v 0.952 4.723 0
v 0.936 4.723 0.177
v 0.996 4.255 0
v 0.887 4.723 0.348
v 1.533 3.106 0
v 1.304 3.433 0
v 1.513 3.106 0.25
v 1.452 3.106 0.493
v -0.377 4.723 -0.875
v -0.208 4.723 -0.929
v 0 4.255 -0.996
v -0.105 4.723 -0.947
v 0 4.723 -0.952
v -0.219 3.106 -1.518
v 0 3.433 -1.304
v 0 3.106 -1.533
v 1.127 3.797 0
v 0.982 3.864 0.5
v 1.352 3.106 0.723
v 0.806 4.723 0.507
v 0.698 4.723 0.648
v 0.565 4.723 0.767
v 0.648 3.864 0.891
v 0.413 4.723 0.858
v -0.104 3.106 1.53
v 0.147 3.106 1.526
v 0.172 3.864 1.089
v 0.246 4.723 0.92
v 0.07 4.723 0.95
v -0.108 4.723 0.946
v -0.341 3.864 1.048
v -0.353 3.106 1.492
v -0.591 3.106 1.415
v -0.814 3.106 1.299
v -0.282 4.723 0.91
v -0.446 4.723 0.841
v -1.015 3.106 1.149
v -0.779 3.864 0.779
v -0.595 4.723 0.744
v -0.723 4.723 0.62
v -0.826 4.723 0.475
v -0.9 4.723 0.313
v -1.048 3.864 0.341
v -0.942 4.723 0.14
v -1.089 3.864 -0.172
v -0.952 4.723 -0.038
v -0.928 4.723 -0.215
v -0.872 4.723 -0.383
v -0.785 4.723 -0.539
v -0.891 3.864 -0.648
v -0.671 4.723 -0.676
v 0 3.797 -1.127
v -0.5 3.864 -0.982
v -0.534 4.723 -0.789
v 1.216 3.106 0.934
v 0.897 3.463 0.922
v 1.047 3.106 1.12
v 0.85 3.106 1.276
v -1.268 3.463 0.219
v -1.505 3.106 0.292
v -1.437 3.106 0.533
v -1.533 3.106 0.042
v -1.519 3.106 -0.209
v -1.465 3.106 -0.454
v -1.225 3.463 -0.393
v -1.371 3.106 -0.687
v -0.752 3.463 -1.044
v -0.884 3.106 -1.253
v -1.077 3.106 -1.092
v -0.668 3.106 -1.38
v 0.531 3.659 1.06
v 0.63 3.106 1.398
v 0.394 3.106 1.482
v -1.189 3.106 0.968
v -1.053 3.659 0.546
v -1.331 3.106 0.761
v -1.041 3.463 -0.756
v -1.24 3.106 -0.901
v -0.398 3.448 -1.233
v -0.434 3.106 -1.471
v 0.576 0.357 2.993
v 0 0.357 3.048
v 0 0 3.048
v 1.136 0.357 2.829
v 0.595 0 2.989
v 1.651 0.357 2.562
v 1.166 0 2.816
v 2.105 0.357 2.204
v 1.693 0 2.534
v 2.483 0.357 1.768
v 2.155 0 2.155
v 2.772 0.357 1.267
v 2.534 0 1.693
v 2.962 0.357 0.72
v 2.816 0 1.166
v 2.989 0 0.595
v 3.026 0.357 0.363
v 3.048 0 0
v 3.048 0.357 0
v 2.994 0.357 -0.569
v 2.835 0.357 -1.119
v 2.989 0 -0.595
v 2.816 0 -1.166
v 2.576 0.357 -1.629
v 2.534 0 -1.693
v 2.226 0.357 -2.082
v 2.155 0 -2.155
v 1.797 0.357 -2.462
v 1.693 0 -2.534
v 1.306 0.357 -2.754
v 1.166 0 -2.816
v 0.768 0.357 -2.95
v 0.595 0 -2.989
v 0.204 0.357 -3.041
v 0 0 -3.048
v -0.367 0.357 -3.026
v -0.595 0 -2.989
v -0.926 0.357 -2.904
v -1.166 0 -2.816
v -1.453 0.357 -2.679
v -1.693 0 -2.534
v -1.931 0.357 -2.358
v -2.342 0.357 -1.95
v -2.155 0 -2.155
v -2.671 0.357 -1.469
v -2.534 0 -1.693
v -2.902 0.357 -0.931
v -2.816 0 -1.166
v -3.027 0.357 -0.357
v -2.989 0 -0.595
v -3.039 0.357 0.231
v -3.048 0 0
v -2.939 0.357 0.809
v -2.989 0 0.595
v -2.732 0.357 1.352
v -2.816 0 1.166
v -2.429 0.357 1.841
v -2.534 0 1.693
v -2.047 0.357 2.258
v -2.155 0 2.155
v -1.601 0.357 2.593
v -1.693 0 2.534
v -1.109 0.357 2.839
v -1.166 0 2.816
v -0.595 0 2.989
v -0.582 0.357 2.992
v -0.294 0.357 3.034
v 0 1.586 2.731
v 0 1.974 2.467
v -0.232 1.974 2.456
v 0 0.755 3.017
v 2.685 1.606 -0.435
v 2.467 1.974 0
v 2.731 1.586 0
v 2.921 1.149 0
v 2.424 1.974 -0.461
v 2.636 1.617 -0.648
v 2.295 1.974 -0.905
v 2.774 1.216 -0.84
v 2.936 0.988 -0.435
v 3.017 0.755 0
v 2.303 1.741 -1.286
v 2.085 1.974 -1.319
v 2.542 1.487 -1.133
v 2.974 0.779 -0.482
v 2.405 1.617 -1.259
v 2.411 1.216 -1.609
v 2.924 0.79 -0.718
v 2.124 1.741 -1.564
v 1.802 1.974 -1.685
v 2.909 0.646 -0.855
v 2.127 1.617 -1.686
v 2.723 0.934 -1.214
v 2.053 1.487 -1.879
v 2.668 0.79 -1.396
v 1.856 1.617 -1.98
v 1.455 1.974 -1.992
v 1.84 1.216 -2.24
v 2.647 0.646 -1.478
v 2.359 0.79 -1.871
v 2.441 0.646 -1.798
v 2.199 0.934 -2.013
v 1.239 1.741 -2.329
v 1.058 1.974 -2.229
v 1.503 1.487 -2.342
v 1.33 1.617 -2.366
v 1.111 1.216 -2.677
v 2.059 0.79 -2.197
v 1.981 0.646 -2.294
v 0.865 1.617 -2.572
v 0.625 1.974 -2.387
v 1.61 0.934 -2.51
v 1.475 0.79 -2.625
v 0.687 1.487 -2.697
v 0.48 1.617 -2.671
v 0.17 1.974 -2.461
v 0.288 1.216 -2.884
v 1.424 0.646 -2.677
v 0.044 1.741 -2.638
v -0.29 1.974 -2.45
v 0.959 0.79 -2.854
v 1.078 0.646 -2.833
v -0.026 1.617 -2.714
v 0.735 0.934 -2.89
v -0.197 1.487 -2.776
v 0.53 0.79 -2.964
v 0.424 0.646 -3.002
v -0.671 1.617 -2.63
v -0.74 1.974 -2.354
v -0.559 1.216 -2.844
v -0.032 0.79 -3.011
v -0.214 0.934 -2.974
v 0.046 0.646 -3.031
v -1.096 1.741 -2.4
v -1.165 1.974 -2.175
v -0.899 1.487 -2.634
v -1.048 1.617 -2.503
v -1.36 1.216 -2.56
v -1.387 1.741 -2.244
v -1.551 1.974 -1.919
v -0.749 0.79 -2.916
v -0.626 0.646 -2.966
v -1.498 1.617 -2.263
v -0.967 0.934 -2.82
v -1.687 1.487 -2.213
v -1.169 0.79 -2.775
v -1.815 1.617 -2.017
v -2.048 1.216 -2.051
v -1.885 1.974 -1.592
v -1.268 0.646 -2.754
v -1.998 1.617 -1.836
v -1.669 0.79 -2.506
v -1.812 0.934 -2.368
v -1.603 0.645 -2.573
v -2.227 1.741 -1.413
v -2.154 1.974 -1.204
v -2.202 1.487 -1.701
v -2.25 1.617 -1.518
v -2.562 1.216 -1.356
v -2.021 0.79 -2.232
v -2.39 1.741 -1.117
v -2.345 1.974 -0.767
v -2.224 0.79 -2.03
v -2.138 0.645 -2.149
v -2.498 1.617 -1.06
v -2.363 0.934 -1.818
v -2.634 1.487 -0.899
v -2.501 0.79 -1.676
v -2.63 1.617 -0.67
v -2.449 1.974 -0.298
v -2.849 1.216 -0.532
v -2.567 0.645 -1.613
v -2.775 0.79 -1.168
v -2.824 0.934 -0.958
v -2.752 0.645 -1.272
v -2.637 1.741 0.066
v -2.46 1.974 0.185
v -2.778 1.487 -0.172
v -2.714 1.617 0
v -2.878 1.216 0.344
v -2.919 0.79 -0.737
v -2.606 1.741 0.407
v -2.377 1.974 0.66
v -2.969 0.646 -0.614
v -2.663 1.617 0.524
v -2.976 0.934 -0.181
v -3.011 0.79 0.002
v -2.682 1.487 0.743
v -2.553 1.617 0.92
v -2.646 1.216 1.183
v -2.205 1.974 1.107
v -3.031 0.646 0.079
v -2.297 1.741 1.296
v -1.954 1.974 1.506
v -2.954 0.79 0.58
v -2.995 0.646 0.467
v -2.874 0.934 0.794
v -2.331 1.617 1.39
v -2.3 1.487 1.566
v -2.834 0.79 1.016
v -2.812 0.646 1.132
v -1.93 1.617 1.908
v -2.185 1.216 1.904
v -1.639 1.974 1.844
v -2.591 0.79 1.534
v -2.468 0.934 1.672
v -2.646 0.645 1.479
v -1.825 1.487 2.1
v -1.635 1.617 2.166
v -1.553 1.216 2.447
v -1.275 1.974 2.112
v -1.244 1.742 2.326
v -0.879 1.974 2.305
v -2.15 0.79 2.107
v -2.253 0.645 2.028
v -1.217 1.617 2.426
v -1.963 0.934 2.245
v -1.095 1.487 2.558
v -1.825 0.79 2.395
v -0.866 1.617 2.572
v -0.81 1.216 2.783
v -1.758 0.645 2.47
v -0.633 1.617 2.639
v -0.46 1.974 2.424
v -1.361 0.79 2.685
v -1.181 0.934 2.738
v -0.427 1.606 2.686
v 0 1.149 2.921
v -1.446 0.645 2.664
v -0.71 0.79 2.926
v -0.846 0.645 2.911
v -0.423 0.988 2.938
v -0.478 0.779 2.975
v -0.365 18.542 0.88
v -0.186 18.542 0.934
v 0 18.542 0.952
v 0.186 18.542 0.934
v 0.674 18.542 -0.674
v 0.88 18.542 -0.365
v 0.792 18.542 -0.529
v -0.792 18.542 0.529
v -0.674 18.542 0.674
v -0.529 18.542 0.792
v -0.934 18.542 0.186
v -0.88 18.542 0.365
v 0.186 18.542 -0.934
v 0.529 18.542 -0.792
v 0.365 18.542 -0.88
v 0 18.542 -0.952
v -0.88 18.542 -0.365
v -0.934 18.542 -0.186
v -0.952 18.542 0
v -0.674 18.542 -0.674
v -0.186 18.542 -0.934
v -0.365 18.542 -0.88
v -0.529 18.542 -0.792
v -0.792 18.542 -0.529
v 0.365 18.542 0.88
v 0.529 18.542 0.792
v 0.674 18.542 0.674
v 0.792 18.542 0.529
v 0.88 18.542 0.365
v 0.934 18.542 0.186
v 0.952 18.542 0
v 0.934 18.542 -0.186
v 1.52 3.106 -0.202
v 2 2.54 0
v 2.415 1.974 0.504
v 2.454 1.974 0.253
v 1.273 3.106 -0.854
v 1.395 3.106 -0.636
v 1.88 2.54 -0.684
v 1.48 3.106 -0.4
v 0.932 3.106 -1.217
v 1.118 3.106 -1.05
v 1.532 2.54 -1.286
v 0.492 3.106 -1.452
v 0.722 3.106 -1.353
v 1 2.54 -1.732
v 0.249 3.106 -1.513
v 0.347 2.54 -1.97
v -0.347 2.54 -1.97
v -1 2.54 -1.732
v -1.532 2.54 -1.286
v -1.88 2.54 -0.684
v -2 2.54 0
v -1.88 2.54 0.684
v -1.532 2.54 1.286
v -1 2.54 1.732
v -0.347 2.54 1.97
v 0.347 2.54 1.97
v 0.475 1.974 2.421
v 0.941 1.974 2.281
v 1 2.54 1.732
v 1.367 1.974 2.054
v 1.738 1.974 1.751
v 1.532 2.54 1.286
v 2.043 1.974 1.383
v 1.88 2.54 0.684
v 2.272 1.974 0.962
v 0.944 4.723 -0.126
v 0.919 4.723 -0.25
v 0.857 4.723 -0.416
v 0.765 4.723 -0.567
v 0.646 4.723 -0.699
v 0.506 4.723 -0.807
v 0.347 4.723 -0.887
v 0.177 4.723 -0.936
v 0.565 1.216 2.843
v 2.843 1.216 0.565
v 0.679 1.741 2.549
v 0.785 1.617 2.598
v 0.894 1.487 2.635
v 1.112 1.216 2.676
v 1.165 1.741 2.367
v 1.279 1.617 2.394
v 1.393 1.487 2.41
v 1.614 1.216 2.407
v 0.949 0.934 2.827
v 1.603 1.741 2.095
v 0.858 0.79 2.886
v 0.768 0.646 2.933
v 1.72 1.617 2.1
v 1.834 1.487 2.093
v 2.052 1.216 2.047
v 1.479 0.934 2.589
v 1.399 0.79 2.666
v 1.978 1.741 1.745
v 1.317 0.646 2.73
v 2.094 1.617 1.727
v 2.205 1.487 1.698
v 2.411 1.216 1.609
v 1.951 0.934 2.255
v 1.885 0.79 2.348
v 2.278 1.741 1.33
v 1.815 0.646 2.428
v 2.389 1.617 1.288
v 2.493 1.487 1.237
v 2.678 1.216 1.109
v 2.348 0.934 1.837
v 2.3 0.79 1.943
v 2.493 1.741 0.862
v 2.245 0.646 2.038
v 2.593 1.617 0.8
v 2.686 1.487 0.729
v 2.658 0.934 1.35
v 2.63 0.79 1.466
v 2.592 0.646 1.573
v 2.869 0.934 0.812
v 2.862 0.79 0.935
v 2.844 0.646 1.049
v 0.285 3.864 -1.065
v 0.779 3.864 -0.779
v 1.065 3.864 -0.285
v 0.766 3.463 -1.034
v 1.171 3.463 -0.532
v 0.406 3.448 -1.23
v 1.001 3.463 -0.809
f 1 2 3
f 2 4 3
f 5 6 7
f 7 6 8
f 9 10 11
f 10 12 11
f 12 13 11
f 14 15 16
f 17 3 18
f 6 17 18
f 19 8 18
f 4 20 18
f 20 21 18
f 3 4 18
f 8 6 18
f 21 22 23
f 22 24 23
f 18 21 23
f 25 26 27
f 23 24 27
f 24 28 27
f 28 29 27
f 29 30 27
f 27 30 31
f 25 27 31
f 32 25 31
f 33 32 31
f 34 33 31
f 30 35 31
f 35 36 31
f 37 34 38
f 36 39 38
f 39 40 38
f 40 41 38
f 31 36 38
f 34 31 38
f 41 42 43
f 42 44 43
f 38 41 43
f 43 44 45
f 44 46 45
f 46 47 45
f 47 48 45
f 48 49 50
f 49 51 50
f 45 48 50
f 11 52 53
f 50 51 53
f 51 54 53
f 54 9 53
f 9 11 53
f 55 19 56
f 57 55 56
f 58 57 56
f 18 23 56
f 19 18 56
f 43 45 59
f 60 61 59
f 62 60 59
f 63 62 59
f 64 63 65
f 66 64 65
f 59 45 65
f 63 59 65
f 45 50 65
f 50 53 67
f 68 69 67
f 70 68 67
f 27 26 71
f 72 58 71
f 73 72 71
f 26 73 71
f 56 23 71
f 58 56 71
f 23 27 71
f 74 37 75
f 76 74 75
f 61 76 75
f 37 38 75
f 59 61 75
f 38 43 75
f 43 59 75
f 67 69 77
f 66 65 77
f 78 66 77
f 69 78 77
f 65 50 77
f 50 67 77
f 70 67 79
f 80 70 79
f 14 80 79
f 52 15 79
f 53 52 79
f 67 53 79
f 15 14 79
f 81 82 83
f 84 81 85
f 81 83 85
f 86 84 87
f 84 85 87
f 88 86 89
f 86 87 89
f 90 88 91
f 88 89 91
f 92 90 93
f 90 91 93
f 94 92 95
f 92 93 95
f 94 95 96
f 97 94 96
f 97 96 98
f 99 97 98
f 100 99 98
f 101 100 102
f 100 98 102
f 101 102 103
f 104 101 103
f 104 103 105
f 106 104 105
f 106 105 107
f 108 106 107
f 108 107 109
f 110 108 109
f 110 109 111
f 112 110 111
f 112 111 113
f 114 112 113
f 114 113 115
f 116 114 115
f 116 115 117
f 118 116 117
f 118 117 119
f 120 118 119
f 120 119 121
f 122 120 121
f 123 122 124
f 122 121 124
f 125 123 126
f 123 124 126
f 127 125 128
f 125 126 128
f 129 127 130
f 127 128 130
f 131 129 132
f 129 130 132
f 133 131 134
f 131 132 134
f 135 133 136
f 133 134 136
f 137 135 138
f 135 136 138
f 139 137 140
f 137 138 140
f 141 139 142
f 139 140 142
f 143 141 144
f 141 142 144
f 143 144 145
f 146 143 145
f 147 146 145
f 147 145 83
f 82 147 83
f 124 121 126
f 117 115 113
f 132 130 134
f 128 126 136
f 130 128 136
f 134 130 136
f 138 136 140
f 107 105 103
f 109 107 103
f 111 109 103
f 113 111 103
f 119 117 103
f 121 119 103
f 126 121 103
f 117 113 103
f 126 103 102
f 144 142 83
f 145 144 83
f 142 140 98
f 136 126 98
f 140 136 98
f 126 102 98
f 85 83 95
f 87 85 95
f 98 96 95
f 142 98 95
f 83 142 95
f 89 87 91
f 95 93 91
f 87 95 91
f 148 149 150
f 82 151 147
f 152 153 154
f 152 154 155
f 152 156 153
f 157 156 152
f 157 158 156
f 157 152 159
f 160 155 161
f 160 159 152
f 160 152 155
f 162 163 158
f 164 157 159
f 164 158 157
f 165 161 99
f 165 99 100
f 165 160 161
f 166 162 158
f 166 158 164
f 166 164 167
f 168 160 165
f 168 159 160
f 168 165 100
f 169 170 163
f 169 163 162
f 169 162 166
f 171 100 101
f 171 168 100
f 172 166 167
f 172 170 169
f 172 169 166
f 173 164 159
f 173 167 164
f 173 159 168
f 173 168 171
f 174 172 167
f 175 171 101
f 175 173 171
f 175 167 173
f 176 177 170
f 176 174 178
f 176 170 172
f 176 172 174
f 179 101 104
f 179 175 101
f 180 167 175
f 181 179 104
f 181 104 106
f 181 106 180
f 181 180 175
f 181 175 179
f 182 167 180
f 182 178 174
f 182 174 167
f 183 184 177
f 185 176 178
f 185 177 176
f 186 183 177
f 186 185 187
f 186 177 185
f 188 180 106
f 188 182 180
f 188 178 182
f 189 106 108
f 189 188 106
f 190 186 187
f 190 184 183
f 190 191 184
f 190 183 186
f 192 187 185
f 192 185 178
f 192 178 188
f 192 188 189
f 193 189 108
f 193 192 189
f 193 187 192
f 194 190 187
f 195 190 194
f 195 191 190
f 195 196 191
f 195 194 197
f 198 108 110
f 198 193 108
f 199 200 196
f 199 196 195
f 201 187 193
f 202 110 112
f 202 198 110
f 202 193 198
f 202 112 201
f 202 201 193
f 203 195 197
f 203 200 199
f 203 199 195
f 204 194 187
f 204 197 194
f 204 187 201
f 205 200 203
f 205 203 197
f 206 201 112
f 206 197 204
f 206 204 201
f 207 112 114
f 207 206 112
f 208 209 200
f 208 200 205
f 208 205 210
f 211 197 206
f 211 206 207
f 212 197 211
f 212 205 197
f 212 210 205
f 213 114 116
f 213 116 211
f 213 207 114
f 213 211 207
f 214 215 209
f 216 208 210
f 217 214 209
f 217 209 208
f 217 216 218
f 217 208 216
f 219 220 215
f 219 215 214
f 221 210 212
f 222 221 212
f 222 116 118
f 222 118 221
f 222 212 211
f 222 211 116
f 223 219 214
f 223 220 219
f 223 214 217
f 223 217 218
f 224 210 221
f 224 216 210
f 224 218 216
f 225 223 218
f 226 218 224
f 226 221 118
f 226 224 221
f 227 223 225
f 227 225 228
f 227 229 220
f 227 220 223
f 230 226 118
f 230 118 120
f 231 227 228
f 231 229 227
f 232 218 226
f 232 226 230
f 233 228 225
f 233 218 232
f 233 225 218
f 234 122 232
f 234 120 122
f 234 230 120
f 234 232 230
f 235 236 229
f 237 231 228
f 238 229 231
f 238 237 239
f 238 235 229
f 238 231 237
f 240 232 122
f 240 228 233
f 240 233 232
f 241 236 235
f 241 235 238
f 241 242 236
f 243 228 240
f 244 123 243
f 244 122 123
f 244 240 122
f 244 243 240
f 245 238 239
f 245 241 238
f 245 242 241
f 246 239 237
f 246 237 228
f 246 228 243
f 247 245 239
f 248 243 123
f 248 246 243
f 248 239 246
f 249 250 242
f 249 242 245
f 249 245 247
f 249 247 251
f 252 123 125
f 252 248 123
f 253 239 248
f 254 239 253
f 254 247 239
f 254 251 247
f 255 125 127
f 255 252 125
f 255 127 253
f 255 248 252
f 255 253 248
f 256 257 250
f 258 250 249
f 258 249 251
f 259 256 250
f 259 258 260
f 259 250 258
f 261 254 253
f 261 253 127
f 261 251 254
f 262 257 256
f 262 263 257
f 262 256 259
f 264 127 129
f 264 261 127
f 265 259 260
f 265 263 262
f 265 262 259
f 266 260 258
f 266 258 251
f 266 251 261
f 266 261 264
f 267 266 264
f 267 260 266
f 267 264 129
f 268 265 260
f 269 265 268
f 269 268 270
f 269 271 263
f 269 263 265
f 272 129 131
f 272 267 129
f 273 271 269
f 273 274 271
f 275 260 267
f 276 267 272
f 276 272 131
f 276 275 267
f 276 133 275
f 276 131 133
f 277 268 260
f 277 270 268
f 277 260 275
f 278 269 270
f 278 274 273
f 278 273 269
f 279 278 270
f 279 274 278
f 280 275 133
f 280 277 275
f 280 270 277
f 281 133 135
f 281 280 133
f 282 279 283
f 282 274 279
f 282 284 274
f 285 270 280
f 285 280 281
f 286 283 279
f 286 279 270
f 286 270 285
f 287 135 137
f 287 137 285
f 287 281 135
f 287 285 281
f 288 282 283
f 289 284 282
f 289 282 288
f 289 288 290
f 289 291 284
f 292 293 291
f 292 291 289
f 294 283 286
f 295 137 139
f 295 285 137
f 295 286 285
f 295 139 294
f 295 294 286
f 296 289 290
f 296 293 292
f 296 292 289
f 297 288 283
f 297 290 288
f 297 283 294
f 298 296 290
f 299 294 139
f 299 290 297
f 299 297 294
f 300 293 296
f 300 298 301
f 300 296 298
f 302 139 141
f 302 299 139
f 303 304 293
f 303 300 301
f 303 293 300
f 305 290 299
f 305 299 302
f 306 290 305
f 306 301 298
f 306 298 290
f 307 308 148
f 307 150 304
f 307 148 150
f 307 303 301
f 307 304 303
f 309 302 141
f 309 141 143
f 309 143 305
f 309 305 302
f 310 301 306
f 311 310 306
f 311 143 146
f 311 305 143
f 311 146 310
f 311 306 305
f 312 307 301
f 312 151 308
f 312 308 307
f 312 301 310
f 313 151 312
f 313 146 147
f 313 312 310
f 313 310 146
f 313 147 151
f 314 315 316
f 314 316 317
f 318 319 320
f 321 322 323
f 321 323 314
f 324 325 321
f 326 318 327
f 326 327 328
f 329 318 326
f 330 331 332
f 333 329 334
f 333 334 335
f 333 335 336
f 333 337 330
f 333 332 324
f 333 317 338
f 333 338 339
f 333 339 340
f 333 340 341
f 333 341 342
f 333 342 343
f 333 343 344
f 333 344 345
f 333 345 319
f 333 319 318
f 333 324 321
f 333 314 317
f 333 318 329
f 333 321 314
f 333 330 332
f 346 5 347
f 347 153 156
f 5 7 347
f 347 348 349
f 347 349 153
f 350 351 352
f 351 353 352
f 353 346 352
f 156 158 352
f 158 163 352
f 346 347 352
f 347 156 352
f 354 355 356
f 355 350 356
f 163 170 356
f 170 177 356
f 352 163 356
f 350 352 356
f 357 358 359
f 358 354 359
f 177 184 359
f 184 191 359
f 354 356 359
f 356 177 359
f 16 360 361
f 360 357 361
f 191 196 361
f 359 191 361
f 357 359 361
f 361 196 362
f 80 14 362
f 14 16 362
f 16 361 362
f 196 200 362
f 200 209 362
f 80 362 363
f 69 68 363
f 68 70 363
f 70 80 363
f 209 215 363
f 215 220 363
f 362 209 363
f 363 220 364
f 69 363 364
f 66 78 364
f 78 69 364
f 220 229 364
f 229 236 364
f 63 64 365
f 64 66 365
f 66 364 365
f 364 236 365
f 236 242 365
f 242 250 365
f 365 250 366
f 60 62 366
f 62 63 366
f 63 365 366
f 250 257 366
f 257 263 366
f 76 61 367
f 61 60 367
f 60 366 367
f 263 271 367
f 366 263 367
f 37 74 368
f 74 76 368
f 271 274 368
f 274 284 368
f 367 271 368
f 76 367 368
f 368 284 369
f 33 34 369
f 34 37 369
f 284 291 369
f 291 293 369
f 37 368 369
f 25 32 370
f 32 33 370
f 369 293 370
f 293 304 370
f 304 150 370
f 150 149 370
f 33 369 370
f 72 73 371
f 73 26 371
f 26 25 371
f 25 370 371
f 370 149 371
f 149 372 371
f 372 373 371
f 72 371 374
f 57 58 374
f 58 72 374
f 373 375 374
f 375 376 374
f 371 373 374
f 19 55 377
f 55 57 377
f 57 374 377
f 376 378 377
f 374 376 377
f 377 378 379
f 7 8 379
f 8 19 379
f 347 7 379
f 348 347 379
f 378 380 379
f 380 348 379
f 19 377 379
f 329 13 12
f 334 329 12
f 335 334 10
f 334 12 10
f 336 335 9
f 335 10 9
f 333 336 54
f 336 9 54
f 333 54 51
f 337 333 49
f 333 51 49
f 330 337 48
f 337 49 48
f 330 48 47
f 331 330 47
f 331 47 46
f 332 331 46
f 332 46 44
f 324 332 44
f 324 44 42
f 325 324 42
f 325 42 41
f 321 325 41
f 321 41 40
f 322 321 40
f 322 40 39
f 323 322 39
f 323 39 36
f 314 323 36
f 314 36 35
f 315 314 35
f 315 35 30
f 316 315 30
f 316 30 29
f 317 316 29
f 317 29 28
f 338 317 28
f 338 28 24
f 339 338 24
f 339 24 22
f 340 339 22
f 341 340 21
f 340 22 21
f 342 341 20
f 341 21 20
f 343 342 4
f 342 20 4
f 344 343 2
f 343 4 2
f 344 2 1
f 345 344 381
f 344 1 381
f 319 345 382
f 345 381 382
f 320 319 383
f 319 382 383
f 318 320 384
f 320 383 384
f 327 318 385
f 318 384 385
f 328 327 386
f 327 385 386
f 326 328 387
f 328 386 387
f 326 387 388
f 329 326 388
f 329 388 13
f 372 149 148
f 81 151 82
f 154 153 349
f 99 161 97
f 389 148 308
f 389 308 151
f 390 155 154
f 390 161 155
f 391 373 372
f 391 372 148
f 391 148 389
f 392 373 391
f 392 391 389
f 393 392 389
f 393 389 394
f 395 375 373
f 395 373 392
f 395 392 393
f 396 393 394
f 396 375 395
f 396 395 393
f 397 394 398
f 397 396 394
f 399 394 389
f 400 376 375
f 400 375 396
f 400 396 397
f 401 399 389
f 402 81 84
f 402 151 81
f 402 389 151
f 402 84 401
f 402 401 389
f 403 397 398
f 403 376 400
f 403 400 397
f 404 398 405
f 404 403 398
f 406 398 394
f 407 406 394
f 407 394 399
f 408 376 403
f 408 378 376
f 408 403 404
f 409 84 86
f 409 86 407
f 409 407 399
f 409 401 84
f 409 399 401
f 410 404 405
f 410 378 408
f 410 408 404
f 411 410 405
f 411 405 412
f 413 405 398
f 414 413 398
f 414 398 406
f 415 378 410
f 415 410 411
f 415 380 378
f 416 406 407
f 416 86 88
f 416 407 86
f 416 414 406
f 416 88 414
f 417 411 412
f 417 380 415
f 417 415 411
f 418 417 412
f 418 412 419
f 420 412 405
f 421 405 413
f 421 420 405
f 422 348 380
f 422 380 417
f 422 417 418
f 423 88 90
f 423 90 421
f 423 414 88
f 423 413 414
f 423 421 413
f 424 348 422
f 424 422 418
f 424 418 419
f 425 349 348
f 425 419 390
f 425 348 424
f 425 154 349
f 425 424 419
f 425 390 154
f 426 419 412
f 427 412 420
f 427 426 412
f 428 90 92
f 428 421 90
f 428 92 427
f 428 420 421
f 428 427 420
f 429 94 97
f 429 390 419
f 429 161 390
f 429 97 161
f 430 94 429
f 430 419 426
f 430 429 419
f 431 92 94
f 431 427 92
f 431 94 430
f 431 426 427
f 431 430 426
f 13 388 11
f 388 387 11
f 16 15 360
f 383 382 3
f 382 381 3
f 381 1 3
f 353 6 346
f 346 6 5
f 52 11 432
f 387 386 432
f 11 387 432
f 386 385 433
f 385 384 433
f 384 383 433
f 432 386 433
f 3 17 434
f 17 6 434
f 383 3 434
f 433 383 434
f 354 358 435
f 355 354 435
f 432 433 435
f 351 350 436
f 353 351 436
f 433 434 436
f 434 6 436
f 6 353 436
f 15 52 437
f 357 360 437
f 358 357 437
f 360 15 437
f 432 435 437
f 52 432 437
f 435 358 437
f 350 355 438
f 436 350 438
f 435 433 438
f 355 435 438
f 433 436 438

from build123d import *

# Parameters (mm, degrees)
SKETCH1_R           = 3.048
BOSS_EXTRUDE1_DEPTH = 1.27
SKETCH2_R           = 0.9525
SKETCH3_R           = 0.9525
BOSS_EXTRUDE2_DEPTH = 14.732
FILLET1_R           = 2.54


with BuildPart() as part:
    # Sketch1 → Boss-Extrude1 (new body)
    with BuildSketch(Plane(origin=(0, 0, 0), x_dir=(1, 0, 0), z_dir=(0, 1, 0))):
        with Locations(Location((0, 0, 0), (0, 0, 270))):
            Circle(SKETCH1_R)
    extrude(amount=BOSS_EXTRUDE1_DEPTH)

    # Sketch2 → section 0 of loft1
    with BuildSketch(Plane(origin=(0, 3.81, 0), x_dir=(1, 0, 0), z_dir=(0, 1, 0)), mode=Mode.PRIVATE) as loft1_s0:
        Circle(SKETCH2_R)
    # loft up to a face of the part (loft1)
    loft([loft1_s0.sketch, Face(Wire([part.edges().sort_by_distance((2.221896376, 1.27, -2.086499579))[0]]))])

    # Sketch3 → Boss-Extrude2 (add)
    with BuildSketch(Plane(origin=(0, 3.81, 0), x_dir=(1, 0, 0), z_dir=(0, 1, 0))):
        with Locations(Location((0, 0, 0), (0, 0, 90))):
            Circle(SKETCH3_R)
    extrude(amount=BOSS_EXTRUDE2_DEPTH)

    # Fillet1
    fillet1_edges = [part.edges().sort_by_distance(p)[0] for p in [
        (-2.155261469, 1.27, -2.155261469),
        (-0.673519209, 3.81, 0.673519209),
    ]]
    fillet(fillet1_edges, radius=FILLET1_R)


solid = part.part
